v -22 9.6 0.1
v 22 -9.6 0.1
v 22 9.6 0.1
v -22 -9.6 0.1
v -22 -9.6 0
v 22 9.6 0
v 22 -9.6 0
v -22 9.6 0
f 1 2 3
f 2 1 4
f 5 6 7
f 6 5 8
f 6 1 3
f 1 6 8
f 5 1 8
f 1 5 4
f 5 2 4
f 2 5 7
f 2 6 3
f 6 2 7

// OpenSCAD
// file: ../p/box5-12.scad
use <../lib.scad>
function ldraw_lib__box5_12() = [
// 0 Box with 5 Faces without Any Edges
// 0 Name: box5-12.dat
// 0 Author: Chris Dee [cwdee]
// 0 !LDRAW_ORG Primitive UPDATE 2009-02
// 0 !LICENSE Licensed under CC BY 2.0 and CC BY 4.0 : see CAreadme.txt
// 
// 0 BFC CERTIFY CCW
  [0,"BFC","CERTIFY"],
  [0,"BFC","CCW"],
// 
// 0 !HISTORY 2009-09-03 [PTadmin] Official Update 2009-02
// 
// 
// 4 16 1 1 1 1 1 -1 -1 1 -1 -1 1 1
  [4,16,1,1,1,1,1,-1,-1,1,-1,-1,1,1],
// 4 16 -1 0 1 1 0 1 1 1 1 -1 1 1
  [4,16,-1,0,1,1,0,1,1,1,1,-1,1,1],
// 4 16 -1 0 -1 -1 0 1 -1 1 1 -1 1 -1
  [4,16,-1,0,-1,-1,0,1,-1,1,1,-1,1,-1],
// 4 16 1 0 -1 -1 0 -1 -1 1 -1 1 1 -1
  [4,16,1,0,-1,-1,0,-1,-1,1,-1,1,1,-1],
// 4 16 1 0 1 1 0 -1 1 1 -1 1 1 1
  [4,16,1,0,1,1,0,-1,1,1,-1,1,1,1],
// 0
];
module ldraw_lib__box5_12(step=0, col=false, unit=2/5, alt=false, line=0.2, solid=!$preview)
    makepoly(ldraw_lib__box5_12(), step=step, col=col, unit=unit, alt=alt, line=line, solid=solid);
ldraw_lib__box5_12(line=0.2);
// main file
use <../lib.scad>
use <../p/box5-12.scad>
function ldraw_lib__4100418b() = [
// 0 Sticker  5.5 x  2.4 Red
// 0 Name: 4100418b.dat
// 0 Author: J.C. Tchang [tchang]
// 0 !LDRAW_ORG Part UPDATE 2013-01
// 0 !LICENSE Licensed under CC BY 2.0 and CC BY 4.0 : see CAreadme.txt
// 
// 0 BFC CERTIFY CW
  [0,"BFC","CERTIFY"],
  [0,"BFC","CW"],
// 
// 0 !KEYWORDS Set 5571
// 
// 0 !HISTORY 2013-07-21 [PTadmin] Official Update 2013-01
// 
// 
// 4 4 -55 -0.25 24 55 -0.25 24 55 -0.25 -24 -55 -0.25 -24
  [4,4,-55,-0.25,24,55,-0.25,24,55,-0.25,-24,-55,-0.25,-24],
// 1 16 0 -0.25 0 55 0 0 0 0.25 0 0 0 24 box5-12.dat
  [1,16,0,-0.25,0,55,0,0,0,0.25,0,0,0,24, ldraw_lib__box5_12()],
];
module ldraw_lib__4100418b(step=0, col=false, unit=2/5, alt=false, line=0.2, solid=!$preview)
    makepoly(ldraw_lib__4100418b(), step=step, col=col, unit=unit, alt=alt, line=line, solid=solid);
ldraw_lib__4100418b(line=0.2);
